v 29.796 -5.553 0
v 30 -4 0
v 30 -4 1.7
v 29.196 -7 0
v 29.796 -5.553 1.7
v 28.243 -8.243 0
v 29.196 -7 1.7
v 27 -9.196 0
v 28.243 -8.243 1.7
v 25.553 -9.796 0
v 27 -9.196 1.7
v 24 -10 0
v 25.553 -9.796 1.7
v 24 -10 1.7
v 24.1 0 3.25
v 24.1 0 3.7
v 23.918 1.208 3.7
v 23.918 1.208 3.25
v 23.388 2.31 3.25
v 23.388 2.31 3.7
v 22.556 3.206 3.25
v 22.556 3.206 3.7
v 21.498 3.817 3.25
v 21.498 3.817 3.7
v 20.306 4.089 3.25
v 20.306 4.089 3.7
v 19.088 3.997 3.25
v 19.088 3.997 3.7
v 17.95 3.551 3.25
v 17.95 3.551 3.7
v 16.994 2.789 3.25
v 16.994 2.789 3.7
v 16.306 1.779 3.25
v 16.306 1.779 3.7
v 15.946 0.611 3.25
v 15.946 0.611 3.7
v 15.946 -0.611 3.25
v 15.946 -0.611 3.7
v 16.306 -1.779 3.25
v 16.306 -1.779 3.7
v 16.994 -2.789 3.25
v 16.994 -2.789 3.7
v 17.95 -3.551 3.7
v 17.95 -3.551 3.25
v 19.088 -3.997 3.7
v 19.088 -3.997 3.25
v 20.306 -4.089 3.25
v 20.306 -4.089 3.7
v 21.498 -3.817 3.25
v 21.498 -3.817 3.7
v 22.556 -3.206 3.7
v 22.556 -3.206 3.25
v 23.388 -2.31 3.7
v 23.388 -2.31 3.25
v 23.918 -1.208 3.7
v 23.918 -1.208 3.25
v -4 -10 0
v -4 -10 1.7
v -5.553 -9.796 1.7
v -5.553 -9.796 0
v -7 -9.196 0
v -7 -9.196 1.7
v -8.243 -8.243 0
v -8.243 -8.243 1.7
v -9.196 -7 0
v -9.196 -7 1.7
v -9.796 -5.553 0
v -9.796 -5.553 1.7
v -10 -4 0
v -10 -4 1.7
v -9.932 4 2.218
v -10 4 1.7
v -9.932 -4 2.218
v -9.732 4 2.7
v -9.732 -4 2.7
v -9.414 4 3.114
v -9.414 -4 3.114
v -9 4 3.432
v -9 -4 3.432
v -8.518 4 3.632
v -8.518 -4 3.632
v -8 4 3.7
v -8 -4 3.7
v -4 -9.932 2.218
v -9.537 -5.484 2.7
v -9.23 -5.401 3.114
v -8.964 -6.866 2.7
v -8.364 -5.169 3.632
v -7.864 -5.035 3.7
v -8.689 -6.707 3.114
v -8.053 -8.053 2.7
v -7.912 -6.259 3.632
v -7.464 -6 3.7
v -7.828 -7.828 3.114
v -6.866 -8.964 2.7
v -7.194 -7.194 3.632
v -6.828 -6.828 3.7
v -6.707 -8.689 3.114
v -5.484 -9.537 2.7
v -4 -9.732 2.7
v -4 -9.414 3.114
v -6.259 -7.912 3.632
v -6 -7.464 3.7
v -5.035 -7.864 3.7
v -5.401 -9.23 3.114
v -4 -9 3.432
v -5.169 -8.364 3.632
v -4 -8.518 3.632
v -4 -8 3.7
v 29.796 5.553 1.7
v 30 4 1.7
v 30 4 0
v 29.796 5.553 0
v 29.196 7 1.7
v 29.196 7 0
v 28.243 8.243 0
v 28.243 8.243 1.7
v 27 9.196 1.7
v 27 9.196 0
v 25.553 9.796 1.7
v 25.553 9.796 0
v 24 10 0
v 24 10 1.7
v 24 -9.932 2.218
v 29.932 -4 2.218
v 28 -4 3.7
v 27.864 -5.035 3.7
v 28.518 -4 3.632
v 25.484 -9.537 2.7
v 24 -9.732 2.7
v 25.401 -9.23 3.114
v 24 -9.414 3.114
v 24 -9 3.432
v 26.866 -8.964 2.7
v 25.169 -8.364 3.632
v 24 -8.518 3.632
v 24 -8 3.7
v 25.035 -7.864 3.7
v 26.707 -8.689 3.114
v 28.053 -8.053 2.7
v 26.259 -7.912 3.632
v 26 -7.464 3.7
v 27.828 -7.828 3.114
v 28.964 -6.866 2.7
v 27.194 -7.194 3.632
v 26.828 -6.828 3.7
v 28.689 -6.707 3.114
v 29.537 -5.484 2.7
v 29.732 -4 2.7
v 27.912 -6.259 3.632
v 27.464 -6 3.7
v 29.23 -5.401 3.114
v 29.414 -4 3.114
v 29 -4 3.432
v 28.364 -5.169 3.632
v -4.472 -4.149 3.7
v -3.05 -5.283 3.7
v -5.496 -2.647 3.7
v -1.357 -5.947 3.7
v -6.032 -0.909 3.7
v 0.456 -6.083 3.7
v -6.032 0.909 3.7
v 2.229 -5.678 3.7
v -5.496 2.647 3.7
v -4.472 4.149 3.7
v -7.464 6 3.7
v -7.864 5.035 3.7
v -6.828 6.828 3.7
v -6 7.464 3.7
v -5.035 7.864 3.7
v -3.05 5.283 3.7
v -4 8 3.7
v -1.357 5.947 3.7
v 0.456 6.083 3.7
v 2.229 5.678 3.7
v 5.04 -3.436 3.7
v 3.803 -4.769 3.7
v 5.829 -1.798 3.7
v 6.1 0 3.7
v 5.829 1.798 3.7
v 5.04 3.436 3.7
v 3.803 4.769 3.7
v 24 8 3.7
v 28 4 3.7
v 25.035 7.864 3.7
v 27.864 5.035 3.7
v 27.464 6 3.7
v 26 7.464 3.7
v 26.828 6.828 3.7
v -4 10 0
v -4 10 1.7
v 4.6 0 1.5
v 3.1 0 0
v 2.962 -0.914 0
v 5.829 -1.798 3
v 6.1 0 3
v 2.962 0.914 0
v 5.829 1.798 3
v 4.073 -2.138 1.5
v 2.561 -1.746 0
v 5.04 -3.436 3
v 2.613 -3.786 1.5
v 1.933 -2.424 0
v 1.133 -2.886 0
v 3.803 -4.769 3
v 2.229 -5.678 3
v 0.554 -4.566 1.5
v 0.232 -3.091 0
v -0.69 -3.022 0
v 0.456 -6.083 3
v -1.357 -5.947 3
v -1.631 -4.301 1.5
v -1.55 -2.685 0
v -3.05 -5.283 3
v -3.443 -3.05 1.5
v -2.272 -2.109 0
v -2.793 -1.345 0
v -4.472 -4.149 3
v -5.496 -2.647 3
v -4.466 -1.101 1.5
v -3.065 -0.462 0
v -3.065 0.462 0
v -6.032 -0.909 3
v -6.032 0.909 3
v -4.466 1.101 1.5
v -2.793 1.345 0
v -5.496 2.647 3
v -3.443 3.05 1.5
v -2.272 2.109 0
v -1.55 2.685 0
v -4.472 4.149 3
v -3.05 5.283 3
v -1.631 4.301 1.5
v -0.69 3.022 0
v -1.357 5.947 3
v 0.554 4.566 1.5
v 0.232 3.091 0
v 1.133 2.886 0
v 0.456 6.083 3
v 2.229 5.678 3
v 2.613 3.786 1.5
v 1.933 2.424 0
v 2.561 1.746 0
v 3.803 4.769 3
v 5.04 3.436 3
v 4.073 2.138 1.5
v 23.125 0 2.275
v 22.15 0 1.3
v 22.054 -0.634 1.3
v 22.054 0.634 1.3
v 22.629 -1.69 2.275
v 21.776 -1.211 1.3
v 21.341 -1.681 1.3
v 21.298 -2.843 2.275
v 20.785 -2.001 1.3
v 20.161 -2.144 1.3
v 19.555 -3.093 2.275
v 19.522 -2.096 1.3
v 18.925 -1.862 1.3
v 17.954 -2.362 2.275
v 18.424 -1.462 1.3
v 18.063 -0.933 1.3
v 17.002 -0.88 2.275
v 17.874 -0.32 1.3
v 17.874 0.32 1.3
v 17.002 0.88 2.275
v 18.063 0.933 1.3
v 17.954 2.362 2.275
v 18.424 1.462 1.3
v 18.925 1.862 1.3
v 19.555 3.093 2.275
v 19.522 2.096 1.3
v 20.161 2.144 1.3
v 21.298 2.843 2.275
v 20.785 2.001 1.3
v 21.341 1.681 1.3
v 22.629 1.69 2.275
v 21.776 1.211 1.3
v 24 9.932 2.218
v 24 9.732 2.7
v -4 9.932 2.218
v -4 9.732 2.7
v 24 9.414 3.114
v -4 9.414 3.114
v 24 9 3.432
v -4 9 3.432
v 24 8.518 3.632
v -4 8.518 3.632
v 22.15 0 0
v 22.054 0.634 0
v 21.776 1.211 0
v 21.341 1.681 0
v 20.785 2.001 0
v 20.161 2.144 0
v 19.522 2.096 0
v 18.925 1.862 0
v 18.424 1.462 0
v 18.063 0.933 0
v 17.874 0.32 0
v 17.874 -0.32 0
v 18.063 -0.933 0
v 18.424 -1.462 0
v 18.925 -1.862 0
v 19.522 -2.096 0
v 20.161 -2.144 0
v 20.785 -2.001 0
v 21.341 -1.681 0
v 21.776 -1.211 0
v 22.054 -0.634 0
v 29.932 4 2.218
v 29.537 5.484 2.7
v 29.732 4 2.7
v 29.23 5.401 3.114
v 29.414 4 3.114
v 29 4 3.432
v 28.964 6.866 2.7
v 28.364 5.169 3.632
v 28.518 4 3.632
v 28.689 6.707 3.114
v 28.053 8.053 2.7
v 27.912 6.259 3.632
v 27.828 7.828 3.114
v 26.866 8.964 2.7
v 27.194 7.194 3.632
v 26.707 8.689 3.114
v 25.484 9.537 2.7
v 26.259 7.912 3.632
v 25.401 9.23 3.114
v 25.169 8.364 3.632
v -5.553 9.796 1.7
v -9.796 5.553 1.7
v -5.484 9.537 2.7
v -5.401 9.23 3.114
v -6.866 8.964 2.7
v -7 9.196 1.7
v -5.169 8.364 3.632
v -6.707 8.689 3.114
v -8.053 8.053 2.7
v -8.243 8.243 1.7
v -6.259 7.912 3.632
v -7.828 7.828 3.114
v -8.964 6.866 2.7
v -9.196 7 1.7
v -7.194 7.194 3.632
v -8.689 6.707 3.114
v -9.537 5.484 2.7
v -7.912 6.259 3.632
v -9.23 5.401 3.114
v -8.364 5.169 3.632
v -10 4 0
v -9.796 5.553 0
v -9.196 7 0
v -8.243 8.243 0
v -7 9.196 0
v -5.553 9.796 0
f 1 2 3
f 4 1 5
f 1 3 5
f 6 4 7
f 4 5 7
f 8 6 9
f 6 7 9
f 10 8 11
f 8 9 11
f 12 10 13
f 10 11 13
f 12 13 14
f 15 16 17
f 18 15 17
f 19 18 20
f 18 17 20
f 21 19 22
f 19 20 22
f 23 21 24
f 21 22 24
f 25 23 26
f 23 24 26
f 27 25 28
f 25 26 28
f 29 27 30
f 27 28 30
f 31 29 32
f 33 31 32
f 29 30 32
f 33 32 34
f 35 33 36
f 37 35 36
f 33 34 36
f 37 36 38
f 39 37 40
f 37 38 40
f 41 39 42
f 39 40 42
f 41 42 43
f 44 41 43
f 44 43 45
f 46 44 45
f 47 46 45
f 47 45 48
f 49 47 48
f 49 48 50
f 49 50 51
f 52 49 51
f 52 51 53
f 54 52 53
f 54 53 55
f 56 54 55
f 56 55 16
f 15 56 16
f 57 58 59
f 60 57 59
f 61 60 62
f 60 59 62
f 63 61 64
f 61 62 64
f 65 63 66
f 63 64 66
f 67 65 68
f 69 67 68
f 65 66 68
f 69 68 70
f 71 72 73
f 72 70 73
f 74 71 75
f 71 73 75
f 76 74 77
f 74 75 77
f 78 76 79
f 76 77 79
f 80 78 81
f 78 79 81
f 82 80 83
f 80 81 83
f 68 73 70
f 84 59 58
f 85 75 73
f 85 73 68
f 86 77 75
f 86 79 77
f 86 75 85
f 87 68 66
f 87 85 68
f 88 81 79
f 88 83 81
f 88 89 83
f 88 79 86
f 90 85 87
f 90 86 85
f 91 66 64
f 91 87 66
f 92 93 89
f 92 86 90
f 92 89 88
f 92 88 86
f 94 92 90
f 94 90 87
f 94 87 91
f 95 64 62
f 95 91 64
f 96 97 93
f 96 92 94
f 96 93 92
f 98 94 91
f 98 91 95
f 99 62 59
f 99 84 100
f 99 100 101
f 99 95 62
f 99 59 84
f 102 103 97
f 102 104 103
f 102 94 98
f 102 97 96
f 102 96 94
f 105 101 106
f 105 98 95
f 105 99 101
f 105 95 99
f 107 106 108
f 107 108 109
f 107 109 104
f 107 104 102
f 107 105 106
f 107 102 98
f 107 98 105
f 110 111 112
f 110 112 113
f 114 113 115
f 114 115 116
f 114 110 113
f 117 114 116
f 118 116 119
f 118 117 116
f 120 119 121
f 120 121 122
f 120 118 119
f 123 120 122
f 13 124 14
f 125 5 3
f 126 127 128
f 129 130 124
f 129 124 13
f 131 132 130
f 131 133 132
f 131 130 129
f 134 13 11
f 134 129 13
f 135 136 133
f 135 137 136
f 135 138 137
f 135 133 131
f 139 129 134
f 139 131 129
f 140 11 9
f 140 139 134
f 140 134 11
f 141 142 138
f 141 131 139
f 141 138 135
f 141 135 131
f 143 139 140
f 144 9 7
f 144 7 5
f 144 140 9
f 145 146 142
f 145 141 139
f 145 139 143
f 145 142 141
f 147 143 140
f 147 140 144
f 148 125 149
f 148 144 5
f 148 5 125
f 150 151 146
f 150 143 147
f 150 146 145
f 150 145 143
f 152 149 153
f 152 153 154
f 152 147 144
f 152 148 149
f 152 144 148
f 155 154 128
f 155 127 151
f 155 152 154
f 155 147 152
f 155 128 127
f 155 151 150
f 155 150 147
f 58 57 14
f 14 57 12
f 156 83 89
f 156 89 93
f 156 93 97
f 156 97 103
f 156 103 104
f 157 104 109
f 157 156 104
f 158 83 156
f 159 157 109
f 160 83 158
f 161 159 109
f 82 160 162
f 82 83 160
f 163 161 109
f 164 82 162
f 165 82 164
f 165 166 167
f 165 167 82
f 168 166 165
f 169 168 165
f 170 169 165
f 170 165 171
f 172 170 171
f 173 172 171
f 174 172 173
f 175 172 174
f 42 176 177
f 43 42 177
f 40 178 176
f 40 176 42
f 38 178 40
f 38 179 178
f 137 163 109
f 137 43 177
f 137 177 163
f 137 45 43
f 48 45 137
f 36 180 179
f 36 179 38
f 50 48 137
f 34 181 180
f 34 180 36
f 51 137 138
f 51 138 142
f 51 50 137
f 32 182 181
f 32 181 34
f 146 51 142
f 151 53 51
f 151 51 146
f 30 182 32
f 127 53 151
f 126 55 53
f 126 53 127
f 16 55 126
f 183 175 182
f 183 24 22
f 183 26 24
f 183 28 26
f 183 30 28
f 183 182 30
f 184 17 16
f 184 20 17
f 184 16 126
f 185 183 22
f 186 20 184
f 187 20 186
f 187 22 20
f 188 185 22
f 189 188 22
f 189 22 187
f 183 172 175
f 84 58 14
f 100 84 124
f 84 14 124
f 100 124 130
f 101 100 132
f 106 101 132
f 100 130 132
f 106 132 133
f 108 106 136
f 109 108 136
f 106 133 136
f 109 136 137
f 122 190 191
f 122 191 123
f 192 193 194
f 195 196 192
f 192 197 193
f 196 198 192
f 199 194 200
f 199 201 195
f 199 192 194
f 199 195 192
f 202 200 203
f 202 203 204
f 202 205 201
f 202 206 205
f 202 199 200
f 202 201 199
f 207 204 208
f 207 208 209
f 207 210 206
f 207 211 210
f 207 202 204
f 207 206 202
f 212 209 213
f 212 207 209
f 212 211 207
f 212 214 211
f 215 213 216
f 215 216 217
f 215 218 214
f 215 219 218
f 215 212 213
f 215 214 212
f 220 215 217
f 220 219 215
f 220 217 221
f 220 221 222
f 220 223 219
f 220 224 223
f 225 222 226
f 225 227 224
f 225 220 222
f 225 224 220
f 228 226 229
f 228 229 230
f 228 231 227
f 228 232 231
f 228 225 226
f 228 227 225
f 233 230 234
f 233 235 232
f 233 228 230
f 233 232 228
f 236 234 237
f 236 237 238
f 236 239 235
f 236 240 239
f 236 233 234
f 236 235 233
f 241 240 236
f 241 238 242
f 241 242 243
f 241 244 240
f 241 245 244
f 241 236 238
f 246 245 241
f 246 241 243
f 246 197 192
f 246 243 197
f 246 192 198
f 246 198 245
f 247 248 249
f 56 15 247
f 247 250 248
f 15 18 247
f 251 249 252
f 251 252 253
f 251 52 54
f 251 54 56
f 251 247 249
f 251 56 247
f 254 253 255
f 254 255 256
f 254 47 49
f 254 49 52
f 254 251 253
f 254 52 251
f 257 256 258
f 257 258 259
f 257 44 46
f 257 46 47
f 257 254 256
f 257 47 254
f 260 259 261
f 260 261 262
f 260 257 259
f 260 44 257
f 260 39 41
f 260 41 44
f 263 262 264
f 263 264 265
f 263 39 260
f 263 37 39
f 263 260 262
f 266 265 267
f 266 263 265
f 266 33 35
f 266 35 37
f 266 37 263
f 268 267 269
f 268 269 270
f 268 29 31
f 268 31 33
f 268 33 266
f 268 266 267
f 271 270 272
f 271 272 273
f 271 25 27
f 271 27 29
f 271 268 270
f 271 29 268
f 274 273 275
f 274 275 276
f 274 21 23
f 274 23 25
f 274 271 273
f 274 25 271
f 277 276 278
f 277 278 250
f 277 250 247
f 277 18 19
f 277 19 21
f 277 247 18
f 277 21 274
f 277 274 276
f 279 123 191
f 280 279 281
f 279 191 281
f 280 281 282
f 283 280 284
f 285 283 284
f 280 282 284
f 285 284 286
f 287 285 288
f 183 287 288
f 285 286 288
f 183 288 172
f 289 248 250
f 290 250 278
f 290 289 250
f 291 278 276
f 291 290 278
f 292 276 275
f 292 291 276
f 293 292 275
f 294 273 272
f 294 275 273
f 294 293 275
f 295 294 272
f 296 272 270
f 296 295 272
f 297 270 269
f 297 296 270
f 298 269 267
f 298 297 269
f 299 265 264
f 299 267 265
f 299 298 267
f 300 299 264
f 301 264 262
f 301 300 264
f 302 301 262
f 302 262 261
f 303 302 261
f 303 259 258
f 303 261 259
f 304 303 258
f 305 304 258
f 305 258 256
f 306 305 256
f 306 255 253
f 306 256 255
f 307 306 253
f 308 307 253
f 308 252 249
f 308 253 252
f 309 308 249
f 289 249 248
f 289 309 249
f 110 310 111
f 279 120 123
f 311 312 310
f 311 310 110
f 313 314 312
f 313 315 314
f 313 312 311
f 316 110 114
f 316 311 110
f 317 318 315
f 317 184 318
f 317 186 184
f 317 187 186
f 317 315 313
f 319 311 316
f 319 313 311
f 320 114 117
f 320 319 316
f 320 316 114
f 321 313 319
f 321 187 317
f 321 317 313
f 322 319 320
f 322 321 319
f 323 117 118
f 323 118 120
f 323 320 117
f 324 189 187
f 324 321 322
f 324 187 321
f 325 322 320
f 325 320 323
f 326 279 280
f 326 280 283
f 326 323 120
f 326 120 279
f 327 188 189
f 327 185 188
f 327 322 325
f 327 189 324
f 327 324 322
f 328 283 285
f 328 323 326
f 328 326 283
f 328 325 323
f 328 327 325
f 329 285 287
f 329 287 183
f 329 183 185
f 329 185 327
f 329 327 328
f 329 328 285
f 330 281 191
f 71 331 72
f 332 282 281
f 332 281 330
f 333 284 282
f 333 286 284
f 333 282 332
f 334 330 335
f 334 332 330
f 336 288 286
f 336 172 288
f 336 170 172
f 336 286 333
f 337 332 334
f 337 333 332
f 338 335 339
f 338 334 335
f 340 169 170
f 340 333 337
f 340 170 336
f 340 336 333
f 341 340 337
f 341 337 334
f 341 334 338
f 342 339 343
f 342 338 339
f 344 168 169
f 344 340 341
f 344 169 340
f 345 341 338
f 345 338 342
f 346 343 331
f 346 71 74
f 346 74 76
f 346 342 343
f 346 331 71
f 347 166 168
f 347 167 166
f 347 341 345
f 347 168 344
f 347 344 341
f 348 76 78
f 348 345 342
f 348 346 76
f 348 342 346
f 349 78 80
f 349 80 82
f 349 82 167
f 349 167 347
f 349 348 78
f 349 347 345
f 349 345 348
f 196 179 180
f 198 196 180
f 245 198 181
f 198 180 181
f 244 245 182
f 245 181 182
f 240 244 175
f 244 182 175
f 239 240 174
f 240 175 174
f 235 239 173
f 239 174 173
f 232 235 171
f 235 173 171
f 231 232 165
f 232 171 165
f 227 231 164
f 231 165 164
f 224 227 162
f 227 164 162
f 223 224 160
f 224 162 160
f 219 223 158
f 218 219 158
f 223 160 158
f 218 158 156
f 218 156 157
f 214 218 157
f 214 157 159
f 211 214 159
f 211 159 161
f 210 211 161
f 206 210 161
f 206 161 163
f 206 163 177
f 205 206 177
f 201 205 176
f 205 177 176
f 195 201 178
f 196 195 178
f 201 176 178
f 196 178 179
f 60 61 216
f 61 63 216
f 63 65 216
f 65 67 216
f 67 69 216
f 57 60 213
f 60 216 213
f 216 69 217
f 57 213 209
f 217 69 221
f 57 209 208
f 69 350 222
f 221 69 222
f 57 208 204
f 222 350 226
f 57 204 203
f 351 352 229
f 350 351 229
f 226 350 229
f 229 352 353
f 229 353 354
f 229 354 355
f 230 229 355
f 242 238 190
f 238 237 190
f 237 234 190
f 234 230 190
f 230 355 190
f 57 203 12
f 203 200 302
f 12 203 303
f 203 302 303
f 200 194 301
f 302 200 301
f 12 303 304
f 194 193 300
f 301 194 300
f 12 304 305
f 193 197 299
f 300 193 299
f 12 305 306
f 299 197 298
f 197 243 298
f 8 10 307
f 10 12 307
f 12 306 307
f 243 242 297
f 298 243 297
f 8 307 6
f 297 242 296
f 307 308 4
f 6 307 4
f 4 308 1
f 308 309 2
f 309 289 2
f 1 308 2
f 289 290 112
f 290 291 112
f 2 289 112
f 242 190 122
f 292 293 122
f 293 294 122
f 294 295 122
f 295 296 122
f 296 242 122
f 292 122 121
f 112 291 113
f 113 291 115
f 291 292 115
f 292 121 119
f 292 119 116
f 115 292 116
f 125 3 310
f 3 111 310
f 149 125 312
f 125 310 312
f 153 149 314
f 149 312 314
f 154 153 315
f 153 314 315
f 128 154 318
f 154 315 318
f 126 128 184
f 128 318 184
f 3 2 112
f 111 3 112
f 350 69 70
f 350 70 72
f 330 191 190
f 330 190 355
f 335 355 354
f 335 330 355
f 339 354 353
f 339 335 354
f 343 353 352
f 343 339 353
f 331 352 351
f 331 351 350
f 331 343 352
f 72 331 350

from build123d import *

# Parameters (mm, degrees)
SKETCH1_W           = 40
SKETCH1_H           = 20
SKETCH1_R           = 3.1
SKETCH1_R_2         = 2.15
BOSS_EXTRUDE1_DEPTH = 3.7
SKETCH2_R           = 6.1
CUT_EXTRUDE1_DEPTH  = 0.7
CHAMFER1_SIZE       = 3
SKETCH3_R           = 4.1
CUT_EXTRUDE2_DEPTH  = 0.4
CHAMFER2_SIZE       = 2
FILLET1_R           = 6
FILLET2_R           = 2


# Some blends are built 0.0001 mm under size
with BuildPart() as part:
    # Sketch1 → Boss-Extrude1 (new body)
    with BuildSketch(Plane.XY):
        with Locations((10, 0)):
            Rectangle(SKETCH1_W, SKETCH1_H)
        Circle(SKETCH1_R, mode=Mode.SUBTRACT)
        with Locations((20, 0)):
            Circle(SKETCH1_R_2, mode=Mode.SUBTRACT)
    extrude(amount=BOSS_EXTRUDE1_DEPTH)

    # Sketch2 → Cut-Extrude1 (cut)
    with BuildSketch(Plane.XY.offset(3.7)):
        Circle(SKETCH2_R)
    extrude(amount=-CUT_EXTRUDE1_DEPTH, mode=Mode.SUBTRACT)

    # Chamfer1
    chamfer1_edges = [part.edges().sort_by_distance(p)[0] for p in [
        (-3.1, 0, 3),
    ]]
    chamfer(chamfer1_edges, length=CHAMFER1_SIZE - 0.0001)  # a hair under: the kernel refuses the full size

    # Sketch3 → Cut-Extrude2 (cut)
    with BuildSketch(Plane.XY.offset(3.7)):
        with Locations((20, 0)):
            Circle(SKETCH3_R)
    extrude(amount=-CUT_EXTRUDE2_DEPTH, mode=Mode.SUBTRACT)

    # Chamfer2
    # the kernel refuses this chamfer: 2 mm, written as the material it takes off along each edge
    with BuildSketch(Plane(origin=(20, 0, 3.3), x_dir=(1, 0, 0), z_dir=(0, 1, 0))) as chamfer2_piece_1_section:
        Polygon((2.15, CHAMFER2_SIZE), (2.15 + CHAMFER2_SIZE, 0), (2.15, 0), align=None)
    chamfer2_piece_1 = revolve(axis=Axis((20, 0, 3.3), (0, 0, -1)), mode=Mode.PRIVATE)
    chamfer2_piece_1 = chamfer2_piece_1 & Plane(origin=(20, 0, 2.270614155), x_dir=(1, 0, 0), z_dir=(0, 0, 1)) * Cylinder(4.1, 17, mode=Mode.PRIVATE)
    add(chamfer2_piece_1, mode=Mode.SUBTRACT)

    # Fillet1
    fillet1_edges = [part.edges().sort_by_distance(p)[0] for p in [
        (-10, 10, 1.85),
        (30, 10, 1.85),
        (30, -10, 1.85),
        (-10, -10, 1.85),
    ]]
    fillet(fillet1_edges, radius=FILLET1_R)

    # Fillet2
    fillet2_edges = [part.edges().sort_by_distance(p)[0] for p in [
        (30, 0, 3.7),
        (10, -10, 3.7),
        (-10, 0, 3.7),
        (10, 10, 3.7),
        (-8.242640687, 8.242640687, 3.7),
        (28.242640687, 8.242640687, 3.7),
        (-8.242640687, -8.242640687, 3.7),
        (28.242640687, -8.242640687, 3.7),
    ]]
    fillet(fillet2_edges, radius=FILLET2_R)


solid = part.part
